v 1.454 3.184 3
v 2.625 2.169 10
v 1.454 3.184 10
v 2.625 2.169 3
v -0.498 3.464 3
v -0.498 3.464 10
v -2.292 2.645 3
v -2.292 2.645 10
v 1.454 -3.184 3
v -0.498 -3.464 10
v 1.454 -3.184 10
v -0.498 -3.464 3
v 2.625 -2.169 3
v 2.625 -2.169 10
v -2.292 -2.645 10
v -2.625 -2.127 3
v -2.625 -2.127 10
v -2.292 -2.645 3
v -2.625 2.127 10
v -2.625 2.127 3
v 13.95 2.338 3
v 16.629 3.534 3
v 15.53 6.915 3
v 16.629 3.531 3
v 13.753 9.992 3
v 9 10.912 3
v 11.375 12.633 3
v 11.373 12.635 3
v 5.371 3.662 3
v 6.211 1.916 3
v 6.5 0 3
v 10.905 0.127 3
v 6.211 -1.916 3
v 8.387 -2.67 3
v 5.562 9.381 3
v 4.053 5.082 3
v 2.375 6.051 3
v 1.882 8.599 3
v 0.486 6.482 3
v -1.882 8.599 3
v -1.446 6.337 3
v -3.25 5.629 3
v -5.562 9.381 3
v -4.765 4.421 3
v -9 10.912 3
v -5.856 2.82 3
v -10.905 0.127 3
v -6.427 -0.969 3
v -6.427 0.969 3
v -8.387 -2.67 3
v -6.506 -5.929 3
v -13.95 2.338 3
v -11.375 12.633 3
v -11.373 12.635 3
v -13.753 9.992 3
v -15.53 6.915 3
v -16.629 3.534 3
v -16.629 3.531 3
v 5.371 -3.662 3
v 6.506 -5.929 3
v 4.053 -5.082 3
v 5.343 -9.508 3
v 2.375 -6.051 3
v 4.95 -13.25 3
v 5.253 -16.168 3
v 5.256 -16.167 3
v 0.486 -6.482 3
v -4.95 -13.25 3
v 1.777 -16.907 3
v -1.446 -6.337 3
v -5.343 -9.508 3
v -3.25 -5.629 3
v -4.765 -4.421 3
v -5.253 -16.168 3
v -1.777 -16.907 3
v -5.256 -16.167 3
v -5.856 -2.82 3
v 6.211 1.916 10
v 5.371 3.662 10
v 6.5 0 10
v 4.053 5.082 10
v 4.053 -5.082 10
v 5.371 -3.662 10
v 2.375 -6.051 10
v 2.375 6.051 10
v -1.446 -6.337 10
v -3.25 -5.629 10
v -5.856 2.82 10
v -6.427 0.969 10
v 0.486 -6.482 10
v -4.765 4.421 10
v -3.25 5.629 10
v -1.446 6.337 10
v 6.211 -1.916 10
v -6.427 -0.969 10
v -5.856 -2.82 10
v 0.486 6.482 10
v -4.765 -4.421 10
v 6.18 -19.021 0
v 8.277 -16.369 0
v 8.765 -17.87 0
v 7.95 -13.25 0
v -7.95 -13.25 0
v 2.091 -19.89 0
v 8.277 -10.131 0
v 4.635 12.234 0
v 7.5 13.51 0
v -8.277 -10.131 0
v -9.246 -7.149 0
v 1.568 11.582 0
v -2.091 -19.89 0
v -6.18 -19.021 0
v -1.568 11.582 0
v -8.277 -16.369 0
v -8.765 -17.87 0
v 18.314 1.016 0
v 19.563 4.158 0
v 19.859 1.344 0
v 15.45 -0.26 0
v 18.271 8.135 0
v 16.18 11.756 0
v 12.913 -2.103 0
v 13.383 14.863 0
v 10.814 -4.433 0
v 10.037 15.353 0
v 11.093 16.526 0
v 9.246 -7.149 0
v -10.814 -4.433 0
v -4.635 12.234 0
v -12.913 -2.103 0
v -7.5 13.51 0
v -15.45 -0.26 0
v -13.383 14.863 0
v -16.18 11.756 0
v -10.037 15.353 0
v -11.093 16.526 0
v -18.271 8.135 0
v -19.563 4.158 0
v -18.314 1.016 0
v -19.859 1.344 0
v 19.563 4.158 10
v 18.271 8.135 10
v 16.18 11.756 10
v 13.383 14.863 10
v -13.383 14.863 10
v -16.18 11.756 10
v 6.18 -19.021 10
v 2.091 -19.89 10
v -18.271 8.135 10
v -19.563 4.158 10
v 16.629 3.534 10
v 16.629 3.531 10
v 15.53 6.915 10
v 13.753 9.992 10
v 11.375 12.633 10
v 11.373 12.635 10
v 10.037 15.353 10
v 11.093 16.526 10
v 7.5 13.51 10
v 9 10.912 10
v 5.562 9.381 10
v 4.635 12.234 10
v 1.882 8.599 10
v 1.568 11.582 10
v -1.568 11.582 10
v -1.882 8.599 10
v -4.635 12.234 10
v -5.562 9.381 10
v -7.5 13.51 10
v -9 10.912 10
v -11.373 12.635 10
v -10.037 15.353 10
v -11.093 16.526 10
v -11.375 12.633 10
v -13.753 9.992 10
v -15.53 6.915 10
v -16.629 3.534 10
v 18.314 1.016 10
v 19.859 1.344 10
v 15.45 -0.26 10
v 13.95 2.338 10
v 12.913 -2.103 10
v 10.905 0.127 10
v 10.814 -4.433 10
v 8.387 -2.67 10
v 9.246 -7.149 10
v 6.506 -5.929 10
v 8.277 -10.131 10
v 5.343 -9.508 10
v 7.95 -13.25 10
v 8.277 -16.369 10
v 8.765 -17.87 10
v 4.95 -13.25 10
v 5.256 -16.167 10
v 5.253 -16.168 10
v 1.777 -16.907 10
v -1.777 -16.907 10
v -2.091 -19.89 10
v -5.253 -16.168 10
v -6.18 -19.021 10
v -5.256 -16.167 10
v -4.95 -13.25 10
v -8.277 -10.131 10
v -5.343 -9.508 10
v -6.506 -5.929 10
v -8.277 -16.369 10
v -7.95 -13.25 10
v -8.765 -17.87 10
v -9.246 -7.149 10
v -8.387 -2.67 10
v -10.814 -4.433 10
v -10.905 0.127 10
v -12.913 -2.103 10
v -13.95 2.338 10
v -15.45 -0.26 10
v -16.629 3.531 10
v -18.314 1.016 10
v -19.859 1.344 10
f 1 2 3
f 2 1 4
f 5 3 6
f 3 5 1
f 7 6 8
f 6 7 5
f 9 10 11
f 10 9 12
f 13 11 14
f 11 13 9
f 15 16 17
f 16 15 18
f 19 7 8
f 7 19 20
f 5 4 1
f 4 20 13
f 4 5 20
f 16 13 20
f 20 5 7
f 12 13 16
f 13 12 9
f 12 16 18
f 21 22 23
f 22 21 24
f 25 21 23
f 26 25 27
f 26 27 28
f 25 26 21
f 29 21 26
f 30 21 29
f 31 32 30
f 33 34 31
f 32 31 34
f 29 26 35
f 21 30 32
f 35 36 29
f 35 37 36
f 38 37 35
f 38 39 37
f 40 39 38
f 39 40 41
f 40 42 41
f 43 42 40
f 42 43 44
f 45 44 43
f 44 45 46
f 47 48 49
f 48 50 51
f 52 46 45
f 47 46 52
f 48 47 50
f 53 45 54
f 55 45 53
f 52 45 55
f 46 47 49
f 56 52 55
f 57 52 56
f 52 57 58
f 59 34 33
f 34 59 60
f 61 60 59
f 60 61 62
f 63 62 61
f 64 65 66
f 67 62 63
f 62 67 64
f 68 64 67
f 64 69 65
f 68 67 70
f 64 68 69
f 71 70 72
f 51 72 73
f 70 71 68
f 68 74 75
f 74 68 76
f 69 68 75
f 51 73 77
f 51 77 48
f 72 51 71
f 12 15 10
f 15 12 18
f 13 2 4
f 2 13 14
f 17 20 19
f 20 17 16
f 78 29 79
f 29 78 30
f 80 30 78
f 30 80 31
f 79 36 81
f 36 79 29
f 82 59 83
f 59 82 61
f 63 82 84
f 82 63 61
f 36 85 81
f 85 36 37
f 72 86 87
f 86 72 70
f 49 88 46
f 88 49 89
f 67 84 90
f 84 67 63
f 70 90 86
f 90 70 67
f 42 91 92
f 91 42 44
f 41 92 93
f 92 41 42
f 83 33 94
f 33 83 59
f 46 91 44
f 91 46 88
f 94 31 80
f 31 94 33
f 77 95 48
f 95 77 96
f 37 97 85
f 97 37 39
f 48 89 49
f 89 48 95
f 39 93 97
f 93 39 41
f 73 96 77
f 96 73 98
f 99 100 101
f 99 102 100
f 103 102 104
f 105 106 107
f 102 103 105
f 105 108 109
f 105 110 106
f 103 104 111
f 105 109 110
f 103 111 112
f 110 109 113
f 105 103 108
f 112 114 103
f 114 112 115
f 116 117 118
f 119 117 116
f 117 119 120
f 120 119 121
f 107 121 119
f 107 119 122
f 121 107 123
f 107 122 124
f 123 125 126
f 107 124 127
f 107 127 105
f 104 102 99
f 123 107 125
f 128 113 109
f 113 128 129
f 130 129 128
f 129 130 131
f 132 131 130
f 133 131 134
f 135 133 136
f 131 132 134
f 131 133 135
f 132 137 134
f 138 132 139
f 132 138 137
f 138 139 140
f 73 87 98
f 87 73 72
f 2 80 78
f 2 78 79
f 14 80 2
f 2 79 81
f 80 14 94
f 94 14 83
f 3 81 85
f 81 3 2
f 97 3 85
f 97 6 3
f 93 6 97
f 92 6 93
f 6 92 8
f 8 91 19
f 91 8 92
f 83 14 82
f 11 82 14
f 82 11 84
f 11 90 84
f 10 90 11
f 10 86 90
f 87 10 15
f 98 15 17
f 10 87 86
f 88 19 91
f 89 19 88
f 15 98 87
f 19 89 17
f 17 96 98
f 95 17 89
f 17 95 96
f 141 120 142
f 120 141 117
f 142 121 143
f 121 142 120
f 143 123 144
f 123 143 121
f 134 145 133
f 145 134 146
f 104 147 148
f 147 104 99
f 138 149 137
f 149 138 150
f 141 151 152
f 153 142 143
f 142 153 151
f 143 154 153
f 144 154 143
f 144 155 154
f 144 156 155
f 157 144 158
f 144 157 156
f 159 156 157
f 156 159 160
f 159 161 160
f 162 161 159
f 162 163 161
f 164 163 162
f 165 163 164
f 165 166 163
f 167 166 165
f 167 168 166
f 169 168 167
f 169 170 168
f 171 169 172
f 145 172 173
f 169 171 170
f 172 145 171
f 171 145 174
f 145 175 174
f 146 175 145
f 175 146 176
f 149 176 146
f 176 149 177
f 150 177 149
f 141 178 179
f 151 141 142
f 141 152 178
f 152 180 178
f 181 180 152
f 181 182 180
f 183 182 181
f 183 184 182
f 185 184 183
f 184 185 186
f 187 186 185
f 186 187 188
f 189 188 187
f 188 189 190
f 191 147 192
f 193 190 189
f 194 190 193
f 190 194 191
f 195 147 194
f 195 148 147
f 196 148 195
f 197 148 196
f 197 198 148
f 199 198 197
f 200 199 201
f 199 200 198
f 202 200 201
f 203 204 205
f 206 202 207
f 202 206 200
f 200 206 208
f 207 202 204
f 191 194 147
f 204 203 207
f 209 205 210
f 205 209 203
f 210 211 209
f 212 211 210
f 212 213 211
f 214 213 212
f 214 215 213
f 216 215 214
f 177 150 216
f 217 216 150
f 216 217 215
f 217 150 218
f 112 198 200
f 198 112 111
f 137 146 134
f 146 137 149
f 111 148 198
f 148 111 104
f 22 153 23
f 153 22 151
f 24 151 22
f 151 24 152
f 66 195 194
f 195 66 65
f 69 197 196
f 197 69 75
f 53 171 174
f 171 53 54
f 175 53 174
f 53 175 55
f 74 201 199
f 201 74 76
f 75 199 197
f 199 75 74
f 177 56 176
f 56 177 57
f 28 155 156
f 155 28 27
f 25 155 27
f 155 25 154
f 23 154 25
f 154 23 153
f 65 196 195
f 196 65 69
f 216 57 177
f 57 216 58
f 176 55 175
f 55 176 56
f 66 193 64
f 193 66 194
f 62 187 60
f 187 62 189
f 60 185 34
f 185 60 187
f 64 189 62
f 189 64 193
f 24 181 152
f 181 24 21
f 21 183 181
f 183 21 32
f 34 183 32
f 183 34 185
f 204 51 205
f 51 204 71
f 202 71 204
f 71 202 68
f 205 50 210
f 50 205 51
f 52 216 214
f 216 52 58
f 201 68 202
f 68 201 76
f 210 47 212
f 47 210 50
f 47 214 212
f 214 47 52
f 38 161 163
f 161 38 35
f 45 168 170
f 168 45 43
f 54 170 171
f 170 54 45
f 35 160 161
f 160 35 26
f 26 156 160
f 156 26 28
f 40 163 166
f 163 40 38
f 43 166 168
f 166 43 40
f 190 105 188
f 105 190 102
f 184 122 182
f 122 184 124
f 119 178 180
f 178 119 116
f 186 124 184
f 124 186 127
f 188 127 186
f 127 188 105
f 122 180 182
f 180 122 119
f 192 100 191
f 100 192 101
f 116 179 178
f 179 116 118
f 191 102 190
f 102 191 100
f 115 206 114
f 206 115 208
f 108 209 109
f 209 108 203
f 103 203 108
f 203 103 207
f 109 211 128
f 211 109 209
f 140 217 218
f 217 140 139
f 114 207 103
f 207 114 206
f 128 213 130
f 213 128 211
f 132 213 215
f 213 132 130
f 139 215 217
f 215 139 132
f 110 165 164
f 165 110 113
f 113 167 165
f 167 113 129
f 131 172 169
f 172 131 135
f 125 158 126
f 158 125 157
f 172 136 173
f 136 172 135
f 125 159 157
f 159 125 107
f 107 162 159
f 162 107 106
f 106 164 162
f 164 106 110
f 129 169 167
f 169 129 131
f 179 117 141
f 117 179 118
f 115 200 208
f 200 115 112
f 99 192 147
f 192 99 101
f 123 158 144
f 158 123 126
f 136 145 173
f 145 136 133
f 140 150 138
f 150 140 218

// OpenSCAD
// [FL_INDEX: keywords="openscad, 3d_parametric, knob, csg_solid" | COT="Parametric OpenSCAD design from 3DCodeverse"]
// Title: knob

thickness=10;
outer_r=20;
knob_r=15;
bolt_r=3.5;
wall_thickness=3;
square_ratio=1.5;


union(){
	difference(){
		cylinder(r=bolt_r+wall_thickness,h=thickness);
		intersection(){
			translate([0,0,wall_thickness])cylinder(r=bolt_r,h=thickness);
			translate([-square_ratio*.5*bolt_r,-bolt_r*2,wall_thickness])cube([square_ratio*bolt_r,bolt_r*4,thickness]);
		}
	}
	intersection(){
		difference(){
			union(){
				difference(){
					cylinder(r=outer_r,h=thickness);
					translate([0,0,wall_thickness])cylinder(r=outer_r-wall_thickness,h=thickness);
					}
				translate([(outer_r+bolt_r+wall_thickness)*sin(120),(outer_r+bolt_r+wall_thickness)*cos(120),0])cylinder(r=knob_r+wall_thickness,h=thickness);
				translate([(outer_r+bolt_r+wall_thickness)*sin(240),(outer_r+bolt_r+wall_thickness)*cos(240),0])cylinder(r=knob_r+wall_thickness,h=thickness);
				translate([(outer_r+bolt_r+wall_thickness)*sin(360),(outer_r+bolt_r+wall_thickness)*cos(360),0])cylinder(r=knob_r+wall_thickness,h=thickness);
			}

			translate([(outer_r+bolt_r+wall_thickness)*sin(120),(outer_r+bolt_r+wall_thickness)*cos(120),-wall_thickness])cylinder(r=knob_r,h=thickness+wall_thickness*2);
			translate([(outer_r+bolt_r+wall_thickness)*sin(240),(outer_r+bolt_r+wall_thickness)*cos(240),-wall_thickness])cylinder(r=knob_r,h=thickness+wall_thickness*2);
			translate([(outer_r+bolt_r+wall_thickness)*sin(360),(outer_r+bolt_r+wall_thickness)*cos(360),-wall_thickness])cylinder(r=knob_r,h=thickness+wall_thickness*2);
		}
	cylinder(r=outer_r,h=thickness);
	}
}
